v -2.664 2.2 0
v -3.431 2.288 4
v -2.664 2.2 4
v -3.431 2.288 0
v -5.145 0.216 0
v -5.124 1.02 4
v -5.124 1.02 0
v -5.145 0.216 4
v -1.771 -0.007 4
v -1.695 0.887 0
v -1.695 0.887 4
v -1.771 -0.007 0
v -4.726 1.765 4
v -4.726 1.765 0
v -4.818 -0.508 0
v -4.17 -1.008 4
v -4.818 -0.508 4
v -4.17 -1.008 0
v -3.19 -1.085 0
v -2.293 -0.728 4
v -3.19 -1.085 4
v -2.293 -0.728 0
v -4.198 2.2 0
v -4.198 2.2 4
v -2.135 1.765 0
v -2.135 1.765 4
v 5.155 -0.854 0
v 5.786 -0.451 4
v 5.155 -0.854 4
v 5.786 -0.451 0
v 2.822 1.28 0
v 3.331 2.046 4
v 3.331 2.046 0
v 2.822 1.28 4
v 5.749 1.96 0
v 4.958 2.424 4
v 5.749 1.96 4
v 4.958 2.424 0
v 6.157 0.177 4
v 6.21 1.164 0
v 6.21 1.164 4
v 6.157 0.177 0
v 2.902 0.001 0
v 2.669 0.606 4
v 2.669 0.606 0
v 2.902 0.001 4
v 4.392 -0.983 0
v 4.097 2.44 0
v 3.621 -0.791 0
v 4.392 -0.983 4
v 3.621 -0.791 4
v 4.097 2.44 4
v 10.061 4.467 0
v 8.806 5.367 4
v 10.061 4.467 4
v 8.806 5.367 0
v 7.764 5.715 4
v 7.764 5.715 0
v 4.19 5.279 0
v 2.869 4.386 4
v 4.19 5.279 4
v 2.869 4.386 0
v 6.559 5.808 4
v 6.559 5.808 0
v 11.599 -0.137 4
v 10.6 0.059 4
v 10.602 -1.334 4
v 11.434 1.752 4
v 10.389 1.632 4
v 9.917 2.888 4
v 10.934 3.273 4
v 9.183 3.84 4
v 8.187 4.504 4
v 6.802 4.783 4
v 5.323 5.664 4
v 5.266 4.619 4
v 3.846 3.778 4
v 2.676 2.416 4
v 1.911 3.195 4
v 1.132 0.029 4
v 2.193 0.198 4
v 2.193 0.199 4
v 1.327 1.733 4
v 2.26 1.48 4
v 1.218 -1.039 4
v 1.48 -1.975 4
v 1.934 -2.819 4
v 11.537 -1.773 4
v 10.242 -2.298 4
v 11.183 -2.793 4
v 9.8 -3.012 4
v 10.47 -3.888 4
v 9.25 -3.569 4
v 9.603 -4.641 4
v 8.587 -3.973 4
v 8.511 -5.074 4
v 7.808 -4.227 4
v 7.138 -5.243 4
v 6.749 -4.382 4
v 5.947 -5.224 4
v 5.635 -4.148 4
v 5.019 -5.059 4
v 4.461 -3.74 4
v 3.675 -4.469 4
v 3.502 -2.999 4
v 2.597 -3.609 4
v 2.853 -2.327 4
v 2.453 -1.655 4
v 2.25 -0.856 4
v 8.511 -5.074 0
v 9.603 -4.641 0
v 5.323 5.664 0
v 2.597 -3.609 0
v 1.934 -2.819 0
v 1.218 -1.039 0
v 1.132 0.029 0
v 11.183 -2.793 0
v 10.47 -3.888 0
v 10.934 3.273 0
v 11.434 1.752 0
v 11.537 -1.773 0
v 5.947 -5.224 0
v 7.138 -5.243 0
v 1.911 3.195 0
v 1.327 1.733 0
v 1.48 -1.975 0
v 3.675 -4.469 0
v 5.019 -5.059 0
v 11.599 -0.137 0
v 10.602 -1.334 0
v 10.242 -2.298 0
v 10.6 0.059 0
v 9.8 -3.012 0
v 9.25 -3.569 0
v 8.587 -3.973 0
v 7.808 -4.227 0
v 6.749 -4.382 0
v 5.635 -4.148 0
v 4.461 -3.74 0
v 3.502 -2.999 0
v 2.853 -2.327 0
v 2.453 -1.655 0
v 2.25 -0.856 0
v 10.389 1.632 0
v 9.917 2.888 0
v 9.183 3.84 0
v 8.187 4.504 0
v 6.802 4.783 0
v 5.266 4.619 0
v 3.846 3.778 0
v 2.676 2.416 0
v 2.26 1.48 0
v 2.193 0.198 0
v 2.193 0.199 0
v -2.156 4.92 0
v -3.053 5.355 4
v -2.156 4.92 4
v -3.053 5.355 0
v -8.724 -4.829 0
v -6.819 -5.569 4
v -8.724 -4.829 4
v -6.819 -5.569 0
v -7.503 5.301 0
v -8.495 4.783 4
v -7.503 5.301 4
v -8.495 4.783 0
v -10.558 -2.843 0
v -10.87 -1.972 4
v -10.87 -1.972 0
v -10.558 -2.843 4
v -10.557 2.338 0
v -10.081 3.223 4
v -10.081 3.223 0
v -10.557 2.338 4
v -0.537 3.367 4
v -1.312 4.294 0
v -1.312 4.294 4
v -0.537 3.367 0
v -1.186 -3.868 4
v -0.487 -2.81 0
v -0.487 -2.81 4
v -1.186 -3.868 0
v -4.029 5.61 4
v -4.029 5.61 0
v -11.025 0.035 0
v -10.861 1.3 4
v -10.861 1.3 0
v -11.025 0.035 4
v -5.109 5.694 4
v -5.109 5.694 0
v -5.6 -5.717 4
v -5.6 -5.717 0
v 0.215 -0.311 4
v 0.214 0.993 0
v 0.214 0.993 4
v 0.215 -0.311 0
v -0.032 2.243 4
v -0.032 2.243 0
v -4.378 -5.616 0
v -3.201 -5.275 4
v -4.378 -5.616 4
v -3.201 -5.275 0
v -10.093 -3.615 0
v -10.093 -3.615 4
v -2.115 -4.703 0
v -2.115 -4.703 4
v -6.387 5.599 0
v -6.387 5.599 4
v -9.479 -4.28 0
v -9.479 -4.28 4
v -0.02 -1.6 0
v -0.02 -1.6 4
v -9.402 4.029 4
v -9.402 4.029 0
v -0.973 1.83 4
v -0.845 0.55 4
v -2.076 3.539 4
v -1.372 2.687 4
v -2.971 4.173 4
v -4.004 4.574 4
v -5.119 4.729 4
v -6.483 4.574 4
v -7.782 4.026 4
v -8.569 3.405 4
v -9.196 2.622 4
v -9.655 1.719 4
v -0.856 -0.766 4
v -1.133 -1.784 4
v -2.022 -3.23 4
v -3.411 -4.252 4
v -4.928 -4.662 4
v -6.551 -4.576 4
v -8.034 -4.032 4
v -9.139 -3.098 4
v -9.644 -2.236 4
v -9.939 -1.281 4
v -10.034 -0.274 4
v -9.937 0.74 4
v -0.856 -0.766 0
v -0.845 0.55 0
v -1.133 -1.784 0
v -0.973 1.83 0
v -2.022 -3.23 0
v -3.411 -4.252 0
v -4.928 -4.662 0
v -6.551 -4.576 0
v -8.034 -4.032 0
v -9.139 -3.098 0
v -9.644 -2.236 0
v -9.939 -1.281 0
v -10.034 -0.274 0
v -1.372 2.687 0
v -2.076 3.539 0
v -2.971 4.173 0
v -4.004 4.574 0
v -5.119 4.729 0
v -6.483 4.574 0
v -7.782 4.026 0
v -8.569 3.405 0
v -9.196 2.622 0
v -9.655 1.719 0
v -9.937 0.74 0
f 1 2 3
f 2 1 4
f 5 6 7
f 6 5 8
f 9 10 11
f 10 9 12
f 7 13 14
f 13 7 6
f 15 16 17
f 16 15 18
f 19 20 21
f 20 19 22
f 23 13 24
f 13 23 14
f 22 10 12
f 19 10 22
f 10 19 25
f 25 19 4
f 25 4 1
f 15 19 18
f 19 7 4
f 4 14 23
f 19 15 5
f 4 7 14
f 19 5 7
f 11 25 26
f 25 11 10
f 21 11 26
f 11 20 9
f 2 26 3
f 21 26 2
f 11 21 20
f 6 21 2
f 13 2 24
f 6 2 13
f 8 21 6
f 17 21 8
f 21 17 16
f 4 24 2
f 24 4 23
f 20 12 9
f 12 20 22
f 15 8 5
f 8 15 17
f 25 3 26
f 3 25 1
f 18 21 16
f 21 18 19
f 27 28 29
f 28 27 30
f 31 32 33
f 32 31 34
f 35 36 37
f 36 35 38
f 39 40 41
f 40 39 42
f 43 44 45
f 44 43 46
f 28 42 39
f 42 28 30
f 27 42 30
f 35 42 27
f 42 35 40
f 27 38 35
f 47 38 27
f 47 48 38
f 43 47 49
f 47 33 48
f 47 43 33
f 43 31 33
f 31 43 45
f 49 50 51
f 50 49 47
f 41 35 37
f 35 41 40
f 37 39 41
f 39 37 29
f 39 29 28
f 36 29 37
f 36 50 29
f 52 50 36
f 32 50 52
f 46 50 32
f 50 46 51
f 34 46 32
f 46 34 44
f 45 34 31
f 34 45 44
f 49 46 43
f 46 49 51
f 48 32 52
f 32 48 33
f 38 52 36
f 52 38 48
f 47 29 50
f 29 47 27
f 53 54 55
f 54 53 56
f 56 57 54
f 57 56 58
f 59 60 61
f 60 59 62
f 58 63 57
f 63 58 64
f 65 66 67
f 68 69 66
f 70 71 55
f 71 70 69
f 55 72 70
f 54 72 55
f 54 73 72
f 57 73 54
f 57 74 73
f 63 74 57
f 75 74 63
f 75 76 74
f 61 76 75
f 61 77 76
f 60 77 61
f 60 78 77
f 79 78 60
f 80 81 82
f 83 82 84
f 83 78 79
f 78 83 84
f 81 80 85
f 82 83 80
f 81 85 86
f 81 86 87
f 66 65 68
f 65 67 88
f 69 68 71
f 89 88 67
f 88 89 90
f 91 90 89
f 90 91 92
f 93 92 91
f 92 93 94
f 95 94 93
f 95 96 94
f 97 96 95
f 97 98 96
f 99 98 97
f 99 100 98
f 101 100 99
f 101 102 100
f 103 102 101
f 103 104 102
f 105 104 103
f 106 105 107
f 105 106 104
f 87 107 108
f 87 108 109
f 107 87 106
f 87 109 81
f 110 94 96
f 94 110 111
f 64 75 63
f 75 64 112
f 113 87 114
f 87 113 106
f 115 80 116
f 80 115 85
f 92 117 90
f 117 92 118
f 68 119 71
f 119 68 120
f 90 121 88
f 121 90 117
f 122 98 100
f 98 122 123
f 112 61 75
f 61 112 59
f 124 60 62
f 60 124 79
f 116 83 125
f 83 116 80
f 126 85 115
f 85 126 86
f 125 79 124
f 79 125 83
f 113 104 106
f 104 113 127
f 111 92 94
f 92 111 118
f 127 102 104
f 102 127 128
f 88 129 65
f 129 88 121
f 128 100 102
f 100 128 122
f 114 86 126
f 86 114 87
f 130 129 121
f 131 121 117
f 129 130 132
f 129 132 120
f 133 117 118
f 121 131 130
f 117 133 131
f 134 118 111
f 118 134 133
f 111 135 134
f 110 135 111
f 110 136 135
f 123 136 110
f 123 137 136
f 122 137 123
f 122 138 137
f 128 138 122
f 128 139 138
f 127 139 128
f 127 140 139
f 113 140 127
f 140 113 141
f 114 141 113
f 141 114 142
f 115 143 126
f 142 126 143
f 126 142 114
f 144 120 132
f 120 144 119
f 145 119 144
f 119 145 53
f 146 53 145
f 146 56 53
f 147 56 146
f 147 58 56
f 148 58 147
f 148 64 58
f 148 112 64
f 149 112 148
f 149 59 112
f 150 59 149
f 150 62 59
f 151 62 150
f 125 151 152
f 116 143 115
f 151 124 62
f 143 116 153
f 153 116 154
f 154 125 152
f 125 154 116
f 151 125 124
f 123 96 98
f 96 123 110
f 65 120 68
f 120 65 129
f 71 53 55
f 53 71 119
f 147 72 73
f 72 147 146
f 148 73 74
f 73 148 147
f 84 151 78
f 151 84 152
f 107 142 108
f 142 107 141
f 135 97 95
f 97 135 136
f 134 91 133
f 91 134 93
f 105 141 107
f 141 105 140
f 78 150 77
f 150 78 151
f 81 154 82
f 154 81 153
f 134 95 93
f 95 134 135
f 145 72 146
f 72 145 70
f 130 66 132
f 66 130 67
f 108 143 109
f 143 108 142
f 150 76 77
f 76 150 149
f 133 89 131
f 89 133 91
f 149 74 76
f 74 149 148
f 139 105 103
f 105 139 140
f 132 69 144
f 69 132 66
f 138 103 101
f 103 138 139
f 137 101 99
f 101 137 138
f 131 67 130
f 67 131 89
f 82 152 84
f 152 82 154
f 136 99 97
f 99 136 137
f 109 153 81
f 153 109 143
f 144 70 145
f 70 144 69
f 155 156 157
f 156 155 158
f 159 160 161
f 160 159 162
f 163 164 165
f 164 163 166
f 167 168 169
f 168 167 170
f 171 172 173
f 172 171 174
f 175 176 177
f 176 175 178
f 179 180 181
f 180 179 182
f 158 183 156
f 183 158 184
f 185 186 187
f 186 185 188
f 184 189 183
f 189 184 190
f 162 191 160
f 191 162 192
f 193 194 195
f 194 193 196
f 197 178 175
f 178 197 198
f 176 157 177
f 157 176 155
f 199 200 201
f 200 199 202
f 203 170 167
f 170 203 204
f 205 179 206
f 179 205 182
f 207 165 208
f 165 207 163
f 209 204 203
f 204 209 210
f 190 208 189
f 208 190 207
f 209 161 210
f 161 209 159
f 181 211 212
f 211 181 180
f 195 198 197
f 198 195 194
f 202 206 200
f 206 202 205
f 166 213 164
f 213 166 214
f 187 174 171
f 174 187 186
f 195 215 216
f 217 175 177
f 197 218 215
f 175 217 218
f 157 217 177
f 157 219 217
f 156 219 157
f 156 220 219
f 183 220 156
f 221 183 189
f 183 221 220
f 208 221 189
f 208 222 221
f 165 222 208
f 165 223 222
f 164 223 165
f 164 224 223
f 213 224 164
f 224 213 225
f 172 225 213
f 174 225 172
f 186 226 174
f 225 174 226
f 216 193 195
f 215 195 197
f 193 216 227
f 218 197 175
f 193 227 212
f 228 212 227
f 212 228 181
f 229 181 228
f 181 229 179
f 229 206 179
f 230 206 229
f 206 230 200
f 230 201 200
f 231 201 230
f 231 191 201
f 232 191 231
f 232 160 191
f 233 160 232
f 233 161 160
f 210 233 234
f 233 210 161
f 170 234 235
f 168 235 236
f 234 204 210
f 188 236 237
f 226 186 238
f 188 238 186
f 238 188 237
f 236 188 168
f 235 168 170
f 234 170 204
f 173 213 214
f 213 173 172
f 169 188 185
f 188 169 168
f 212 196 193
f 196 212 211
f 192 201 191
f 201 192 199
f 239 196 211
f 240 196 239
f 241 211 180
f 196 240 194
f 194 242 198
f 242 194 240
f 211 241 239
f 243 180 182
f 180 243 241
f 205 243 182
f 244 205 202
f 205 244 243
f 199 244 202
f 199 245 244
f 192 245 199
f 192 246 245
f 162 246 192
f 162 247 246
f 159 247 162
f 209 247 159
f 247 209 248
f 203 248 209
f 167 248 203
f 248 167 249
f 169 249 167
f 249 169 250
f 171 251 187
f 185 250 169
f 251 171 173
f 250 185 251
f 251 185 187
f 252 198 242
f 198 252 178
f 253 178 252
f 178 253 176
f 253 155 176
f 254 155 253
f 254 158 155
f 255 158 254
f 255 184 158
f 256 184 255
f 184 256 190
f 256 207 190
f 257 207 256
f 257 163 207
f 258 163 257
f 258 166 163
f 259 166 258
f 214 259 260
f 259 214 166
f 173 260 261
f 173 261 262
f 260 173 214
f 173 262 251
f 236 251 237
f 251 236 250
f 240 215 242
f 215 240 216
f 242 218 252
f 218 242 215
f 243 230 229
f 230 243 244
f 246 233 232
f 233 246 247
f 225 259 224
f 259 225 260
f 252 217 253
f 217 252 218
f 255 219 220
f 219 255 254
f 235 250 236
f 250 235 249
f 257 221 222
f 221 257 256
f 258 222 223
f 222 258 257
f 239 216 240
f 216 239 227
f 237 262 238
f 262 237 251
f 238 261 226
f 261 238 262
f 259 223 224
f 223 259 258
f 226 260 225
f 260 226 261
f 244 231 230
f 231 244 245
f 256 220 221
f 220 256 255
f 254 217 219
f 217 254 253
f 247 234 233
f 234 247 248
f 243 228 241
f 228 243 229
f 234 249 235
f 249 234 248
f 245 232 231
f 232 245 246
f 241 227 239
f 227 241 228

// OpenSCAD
// Module names are of the form poly_<inkscape-path-id>().  As a result,
// you can associate a polygon in this OpenSCAD program with the corresponding
// SVG element in the Inkscape document by looking for the XML element with
// the attribute id="inkscape-path-id".

// fudge value is used to ensure that subtracted solids are a tad taller
// in the z dimension than the polygon being subtracted from.  This helps
// keep the resulting .stl file manifold.
fudge = 0.1;

module poly_path4138375(h)
{
  scale([25.4/90, -25.4/90, 1]) union()
  {
    linear_extrude(height=h)
      polygon([[-14.774480,3.573381],[-17.070983,1.799429],[-18.231885,-0.763726],[-18.156734,-3.615113],[-16.745079,-6.253763],[-14.873498,-7.796334],[-12.155571,-8.108301],[-9.437608,-7.796334],[-7.566005,-6.253763],[-6.006554,-3.141746],[-6.275105,0.025660],[-8.123546,2.578061],[-11.303766,3.845063],[-14.774480,3.573381]]);
    linear_extrude(height=h)
      polygon([[12.830654,2.801237],[10.284144,-0.004728],[9.455722,-2.148320],[10.000204,-4.534114],[11.802036,-7.249736],[14.518147,-8.646770],[17.567652,-8.590167],[20.369664,-6.944879],[22.005379,-4.123368],[21.816464,-0.625900],[20.500302,1.598714],[18.266722,3.024802],[15.561560,3.482323],[12.830654,2.801237]]);
  }
}

module poly_path42135(h)
{
  scale([25.4/90, -25.4/90, 1]) union()
  {
    difference()
    {
       linear_extrude(height=h)
         polygon([[23.241410,-20.578190],[18.862003,-20.069106],[14.847220,-18.704633],[10.167360,-15.539601],[6.769715,-11.319599],[4.702027,-6.141987],[4.012038,-0.104128],[4.315136,3.680613],[5.243595,6.999790],[6.854070,9.989838],[9.203217,12.787195],[13.022612,15.833445],[17.784729,17.927139],[21.073798,18.508689],[25.292925,18.576499],[30.157569,17.977483],[34.025362,16.443941],[37.098859,13.777313],[39.625527,9.895336],[40.880439,6.282375],[41.099385,0.483750],[40.512851,-6.207340],[38.743254,-11.597962],[35.650401,-15.827741],[31.201476,-19.016734],[27.509526,-20.251670],[23.241410,-20.578190]]);
       translate([0, 0, -fudge])
         linear_extrude(height=h+2*fudge)
           polygon([[24.101360,-16.947527],[29.007432,-15.958108],[32.537434,-13.607985],[35.138179,-10.232532],[36.811701,-5.782923],[37.560036,-0.210334],[37.567489,4.728273],[36.289240,8.142891],[34.725292,10.671233],[32.774391,12.645998],[30.425531,14.077634],[27.667708,14.976584],[23.914260,15.527340],[19.964797,14.698951],[15.805582,13.252644],[12.408137,10.624819],[10.107883,8.243586],[8.690697,5.863245],[7.972779,3.031692],[7.770334,-0.703178],[7.770334,-0.704132],[8.008522,-5.243624],[9.483650,-8.561713],[13.626653,-13.387076],[18.658607,-16.367123],[24.101360,-16.947546]]);
    }
    difference()
    {
       linear_extrude(height=h)
         polygon([[-18.101704,-20.175715],[-22.631208,-19.839745],[-26.586192,-18.782118],[-30.101959,-16.946711],[-33.313813,-14.277405],[-35.719086,-11.421753],[-37.405757,-8.284188],[-38.484003,-4.604803],[-39.063997,-0.123690],[-38.515128,6.986358],[-37.411903,10.073103],[-35.764058,12.810483],[-33.588197,15.164432],[-30.913039,17.111206],[-24.161228,19.733619],[-19.842678,20.258028],[-15.513985,19.900519],[-11.342311,18.691876],[-7.494818,16.662882],[-4.203444,13.706823],[-1.727163,9.957425],[-0.070626,5.670162],[0.761517,1.100507],[0.759576,-3.516858],[-0.113053,-7.946522],[-1.901393,-11.931927],[-4.650469,-15.216514],[-7.638045,-17.433159],[-10.817057,-18.975973],[-14.275584,-19.878857],[-18.101704,-20.175715]]);
       translate([0, 0, -fudge])
         linear_extrude(height=h+2*fudge)
           polygon([[-18.137146,-16.757468],[-14.187929,-16.205964],[-10.528646,-14.784642],[-7.354821,-12.540691],[-4.861974,-9.521300],[-3.447706,-6.485260],[-2.995872,-1.947873],[-3.032817,2.715446],[-4.013234,6.319639],[-7.165891,11.443971],[-12.085111,15.066023],[-17.461577,16.520535],[-23.212793,16.212893],[-28.466198,14.285091],[-32.384029,10.977919],[-34.170891,7.922621],[-35.218238,4.537245],[-35.554681,0.972545],[-35.208833,-2.620723],[-34.209308,-6.091803],[-32.584717,-9.289939],[-30.363674,-12.064376],[-27.574790,-14.264359],[-22.970843,-16.206246],[-18.137146,-16.757468]]);
    }
  }
}

module poly_path41883(h)
{
  scale([25.4/90, -25.4/90, 1]) union()
  {
    difference()
    {
       linear_extrude(height=h)
         polygon([[28.673387,-76.404478],[25.912814,-75.649136],[23.524410,-73.948446],[19.074638,-69.936101],[18.823504,-70.108233],[15.751698,-70.583826],[12.004675,-69.449860],[10.936355,-71.034572],[9.480295,-72.118842],[6.974586,-72.284769],[5.630328,-71.508388],[5.044742,-71.754166],[3.099236,-71.515988],[1.605594,-70.527039],[1.410384,-70.242219],[-0.220489,-71.503950],[-2.291404,-71.886247],[-4.341943,-71.267039],[-4.532747,-71.083373],[-4.721733,-72.094887],[-6.008296,-74.031850],[-8.275318,-74.786938],[-10.999769,-74.021764],[-13.048094,-72.068270],[-14.096879,-68.117146],[-15.580424,-69.763078],[-18.000952,-71.491529],[-20.443695,-71.621071],[-22.241340,-70.101137],[-24.751501,-71.014161],[-26.132148,-71.246633],[-27.161699,-71.234395],[-28.542909,-70.689413],[-29.621007,-69.476722],[-30.024682,-68.321224],[-30.109862,-66.942366],[-29.750515,-64.142066],[-28.962632,-60.788094],[-28.839291,-60.343557],[-36.119889,-58.311481],[-45.463628,-53.861870],[-50.316241,-50.949772],[-51.574685,-49.251212],[-52.154718,-47.344693],[-53.154698,-46.799007],[-56.701361,-44.463145],[-60.428739,-41.222361],[-63.834174,-37.849754],[-65.096796,-36.346679],[-66.071930,-34.589834],[-66.228094,-32.289081],[-68.868683,-29.668899],[-73.623696,-24.430312],[-74.329000,-23.011185],[-74.242141,-20.860727],[-73.589092,-19.777338],[-76.242992,-15.397655],[-78.679502,-11.594707],[-79.474518,-10.216740],[-79.766434,-9.625803],[-80.082314,-8.243397],[-79.389337,-6.320631],[-81.450523,-3.892993],[-84.567585,-0.625087],[-85.285421,0.681741],[-85.261452,2.172551],[-84.339552,5.435138],[-82.340477,12.930112],[-82.310312,13.096924],[-83.418546,15.930942],[-84.237517,20.122521],[-84.499268,24.234243],[-84.292528,26.092241],[-83.956233,27.238484],[-82.651033,28.568679],[-81.272752,29.099781],[-80.455867,29.042495],[-79.809029,28.925373],[-79.137349,30.288257],[-78.441710,30.824180],[-78.630701,35.889749],[-78.208235,38.757762],[-76.529588,41.272962],[-74.955863,42.066292],[-73.408973,42.251648],[-73.108180,42.201073],[-72.687603,45.418403],[-71.510166,50.160105],[-70.105578,53.337507],[-69.276270,54.159497],[-67.920170,54.758952],[-67.090550,54.720801],[-65.601672,57.380910],[-63.410240,58.904459],[-60.798744,59.364013],[-59.576941,59.057896],[-59.332935,59.822744],[-58.298351,63.799599],[-57.913264,65.936204],[-57.286832,68.795954],[-55.828307,70.162551],[-53.887607,70.716947],[-51.233460,69.924190],[-49.321590,68.192594],[-46.252089,69.971968],[-42.212585,71.195199],[-39.007685,72.476452],[-38.555230,72.950080],[-38.627895,72.117098],[-38.141385,73.880563],[-37.076024,75.056705],[-34.583626,75.836637],[-31.943946,74.938694],[-31.795755,74.748813],[-29.533140,74.942244],[-28.619235,75.077112],[-28.379731,75.205065],[-28.732808,74.900541],[-27.739039,75.515436],[-26.257095,76.182206],[-24.575829,76.255440],[-22.618477,75.389716],[-21.198783,74.068259],[-19.448158,73.478207],[-17.742781,74.053174],[-14.704684,76.038939],[-10.714522,76.404505],[-6.525799,75.929171],[-2.698718,74.332672],[0.149966,72.916666],[2.495508,72.332710],[10.149330,72.976886],[19.164311,73.733948],[28.061130,71.960046],[35.222497,70.713398],[39.022764,70.960066],[40.159097,71.514058],[41.871011,71.690309],[43.085704,71.304336],[45.095413,72.199616],[47.173131,71.974381],[48.881506,70.896180],[50.467995,67.714342],[51.065120,67.780002],[52.785591,67.325850],[54.278938,66.072847],[55.000852,64.214182],[54.895597,62.314268],[55.085158,62.831340],[55.283338,62.384364],[56.865374,62.823574],[58.649640,62.636936],[60.224703,61.858198],[62.311739,59.533954],[64.110150,56.233638],[68.312377,48.128202],[68.372707,48.012854],[70.453423,48.578948],[72.877494,47.737792],[74.177368,45.657974],[74.807384,41.071549],[74.807384,41.027182],[77.099256,41.764524],[79.337885,40.975719],[80.501152,39.257918],[80.651978,36.499317],[79.968764,33.782421],[81.666146,32.377836],[82.263015,30.716254],[82.221612,29.175590],[81.368037,26.710686],[82.993260,25.109275],[83.600442,23.016878],[83.704351,23.179979],[83.844444,22.688578],[85.022896,20.365126],[85.285421,17.971721],[85.285421,17.970812],[85.228635,16.535168],[84.191389,14.306284],[82.363579,13.396809],[82.417685,12.639059],[81.893293,10.420823],[82.372438,10.037508],[83.303407,8.318723],[83.486868,6.827279],[83.518624,4.346947],[82.958069,1.921426],[82.470066,1.036792],[83.816016,0.260741],[84.898589,-1.255975],[85.177583,-3.087119],[84.804505,-4.310045],[83.634196,-6.399624],[83.634196,-6.400532],[82.010410,-9.911554],[80.410083,-13.240376],[77.718596,-16.640796],[78.754934,-17.402985],[79.625362,-19.751653],[78.945283,-22.017894],[77.389414,-23.819013],[72.255519,-27.234206],[68.401101,-29.828657],[70.671711,-32.937737],[71.544332,-34.859656],[71.537688,-37.250875],[70.826734,-38.628502],[69.630013,-39.650120],[69.213879,-39.785877],[69.252949,-39.916309],[69.174072,-41.076174],[68.410005,-42.457521],[66.778269,-43.442418],[65.458860,-43.785801],[62.470464,-44.140719],[56.805089,-43.996090],[58.927100,-46.443291],[59.750010,-49.484894],[59.329469,-51.314493],[57.237214,-52.995030],[55.569158,-53.190588],[54.234598,-52.962184],[52.234656,-53.037602],[48.618015,-53.538035],[47.720102,-53.733241],[50.698731,-59.453630],[51.049986,-62.349758],[49.946328,-65.135863],[48.601825,-66.220425],[46.973877,-66.723233],[44.795579,-66.424216],[44.610136,-67.240525],[43.840799,-68.661731],[42.299592,-69.808358],[40.359089,-70.007900],[38.795662,-69.450778],[36.768190,-67.655782],[36.545494,-67.481869],[36.158662,-68.187270],[34.968007,-69.202869],[33.246542,-69.676149],[32.586406,-69.606056],[32.722149,-70.694764],[32.815552,-72.318792],[32.394739,-74.071806],[30.826218,-75.729002],[28.671657,-76.404505]]);
       translate([0, 0, -fudge])
         linear_extrude(height=h+2*fudge)
           polygon([[29.340610,-69.223603],[29.257202,-69.146409],[29.340610,-69.223603]]);
       translate([0, 0, -fudge])
         linear_extrude(height=h+2*fudge)
           polygon([[24.604269,-67.590095],[24.562474,-67.470307],[24.557931,-67.466673],[24.603360,-67.590009]]);
       translate([0, 0, -fudge])
         linear_extrude(height=h+2*fudge)
           polygon([[9.143163,-66.962778],[9.149523,-66.960961],[9.184958,-66.846501],[9.143163,-66.962737]]);
       translate([0, 0, -fudge])
         linear_extrude(height=h+2*fudge)
           polygon([[15.457997,-63.631870],[15.396803,-63.232590],[15.357734,-63.237906],[15.457997,-63.631861]]);
       translate([0, 0, -fudge])
         linear_extrude(height=h+2*fudge)
           polygon([[23.443682,-63.631870],[24.283860,-62.131208],[25.456072,-61.184716],[25.486964,-61.173177],[24.729200,-59.661224],[24.408104,-58.463607],[24.740103,-56.714518],[26.342537,-55.103194],[27.894408,-54.773117],[29.623772,-55.150218],[31.056754,-55.755352],[33.064692,-56.757994],[33.003453,-56.362263],[33.626365,-54.405477],[35.053140,-52.977235],[37.114321,-52.522940],[36.898713,-51.164490],[37.281280,-49.657728],[37.932370,-48.877047],[38.777086,-48.302078],[40.078777,-47.789225],[43.296092,-47.003081],[46.719249,-46.422788],[46.099046,-45.705856],[45.418512,-44.291509],[45.703310,-41.844350],[47.314648,-40.404272],[47.423770,-39.460188],[48.403925,-37.599735],[50.382001,-36.886149],[57.054456,-37.045861],[57.105065,-37.045861],[56.805139,-36.635042],[56.206242,-34.677672],[56.632445,-32.967007],[57.719953,-31.579241],[59.976344,-30.715903],[59.613453,-29.123209],[59.990217,-27.408769],[60.750054,-26.333553],[62.530844,-24.661889],[65.250434,-22.779050],[64.724270,-21.228061],[65.177656,-19.578580],[65.628408,-18.877617],[66.760601,-17.464156],[70.120793,-13.884812],[74.422374,-8.778429],[73.106895,-8.739881],[71.697514,-8.064160],[70.640637,-6.549929],[70.402955,-5.116568],[71.519203,-1.302574],[74.574972,2.706711],[74.873125,3.177865],[74.166833,3.389925],[72.437515,5.099741],[72.165982,6.861910],[73.393987,10.202576],[72.753386,10.886680],[72.204143,12.889302],[72.885585,15.192718],[74.090512,17.313352],[74.533267,17.954867],[72.256478,17.975264],[70.482775,18.800450],[69.279620,21.075472],[69.499454,22.946178],[70.216603,24.184552],[70.315095,24.304336],[70.021393,25.091366],[69.868795,27.050512],[68.655874,27.685816],[67.741060,29.041604],[67.373717,30.990988],[67.441135,36.704277],[67.454309,37.724668],[67.135758,37.708677],[65.466770,38.585325],[63.959283,40.519627],[59.918512,48.063405],[56.844072,54.149358],[56.594710,53.991420],[54.968289,53.551322],[53.562973,53.803326],[52.898249,54.248735],[51.939097,55.040202],[50.221272,56.925703],[49.686249,57.666594],[48.366840,57.041051],[45.998647,57.312563],[44.491938,58.681481],[43.955229,60.123513],[43.769786,61.886567],[43.207232,61.670954],[41.611437,61.633942],[40.042251,62.268103],[39.009412,63.394968],[35.663440,63.548470],[30.090770,63.966382],[24.780762,65.244089],[18.736614,66.585757],[12.151912,65.812845],[6.809194,65.046544],[2.339365,65.073069],[-1.836566,65.952171],[-6.297591,67.743598],[-11.537064,69.846486],[-12.996906,68.246970],[-14.747582,67.174455],[-18.677125,66.236085],[-22.004607,66.397571],[-25.154369,67.650432],[-26.346893,67.224531],[-28.017006,67.278747],[-29.243022,67.716092],[-30.739947,66.641783],[-32.479873,66.102103],[-34.570356,66.363855],[-36.678556,65.284905],[-40.342217,64.098592],[-43.276290,63.216108],[-44.789332,62.033858],[-46.471640,60.450924],[-47.306584,59.835142],[-47.780993,59.458467],[-49.204509,59.230007],[-50.535614,59.437214],[-51.034995,59.785453],[-51.547853,60.150132],[-53.488364,53.321513],[-54.541583,50.657855],[-55.537602,49.435409],[-57.166203,48.557628],[-58.671055,48.517700],[-58.490931,47.808752],[-58.688377,45.833638],[-60.066766,43.953457],[-62.090156,43.293473],[-63.778323,43.560386],[-65.384323,44.208111],[-65.715407,42.058308],[-65.340847,40.382097],[-65.340847,40.381188],[-64.786285,38.239259],[-64.676264,37.184264],[-64.740147,36.406997],[-65.586625,34.783247],[-67.190854,33.939431],[-67.922873,33.865785],[-68.988512,33.931445],[-71.291042,34.375977],[-71.296357,34.341359],[-71.421656,32.961408],[-70.948540,32.191446],[-69.840125,29.921179],[-69.818127,27.337946],[-70.328318,26.270531],[-69.787072,25.705324],[-69.156206,24.831338],[-68.586561,22.963582],[-69.053805,21.369443],[-69.969853,20.321217],[-71.451635,19.674383],[-73.782558,19.509343],[-76.620124,19.931696],[-75.913841,17.073723],[-75.221574,15.234397],[-74.979516,13.030322],[-76.231489,7.057940],[-77.352143,2.615254],[-75.016786,0.066061],[-71.981800,-3.560453],[-71.149486,-5.268686],[-70.858035,-7.176925],[-71.212067,-9.324181],[-71.217382,-9.336583],[-69.441903,-12.221178],[-66.695126,-16.685985],[-65.747210,-20.461482],[-65.958384,-22.075473],[-64.280510,-23.570562],[-59.505090,-28.358402],[-58.418429,-30.422226],[-58.100506,-32.767370],[-57.876020,-33.093894],[-55.367636,-35.751342],[-48.940964,-40.604841],[-47.031509,-41.544911],[-45.446796,-42.793797],[-44.371394,-45.123834],[-44.438829,-45.978299],[-38.594209,-48.974691],[-31.840639,-51.957579],[-27.301621,-53.199102],[-24.182796,-53.734143],[-23.141098,-53.935554],[-22.749814,-54.023397],[-22.507584,-54.089946],[-21.720564,-54.459947],[-21.720564,-54.460855],[-20.612311,-55.641845],[-17.744575,-54.773183],[-15.669221,-55.131654],[-14.563751,-56.094904],[-13.851133,-57.455476],[-13.396838,-57.230105],[-12.027775,-57.044657],[-9.030474,-58.225647],[-8.627651,-58.711887],[-6.806684,-58.225878],[-5.088240,-58.450132],[-3.310993,-59.529972],[-1.346486,-58.748263],[0.890370,-59.259344],[1.934703,-59.775750],[3.437783,-58.443922],[5.083739,-58.180394],[7.635212,-58.886569],[9.268203,-60.419927],[9.356927,-60.561008],[9.756206,-60.336523],[9.935954,-58.990058],[10.680787,-57.687948],[12.204242,-56.714171],[13.706436,-56.476789],[15.322226,-56.870749],[16.236994,-57.396027],[18.151802,-58.836105],[23.346890,-63.540541],[23.442746,-63.631932]]);
       translate([0, 0, -fudge])
         linear_extrude(height=h+2*fudge)
           polygon([[15.315167,-62.700211],[15.203365,-62.599063],[15.315167,-62.700211]]);
       translate([0, 0, -fudge])
         linear_extrude(height=h+2*fudge)
           polygon([[52.176057,-47.034141],[52.418287,-46.941860],[52.186687,-46.973797],[52.176239,-47.034132]]);
       translate([0, 0, -fudge])
         linear_extrude(height=h+2*fudge)
           polygon([[48.348260,-40.138087],[49.138823,-40.008540],[48.348260,-40.138087]]);
       translate([0, 0, -fudge])
         linear_extrude(height=h+2*fudge)
           polygon([[82.797481,19.755182],[82.551662,19.857222],[82.636842,19.788014],[82.797481,19.755169]]);
       translate([0, 0, -fudge])
         linear_extrude(height=h+2*fudge)
           polygon([[-74.171157,24.006210],[-73.284751,24.182781],[-74.171157,24.006210]]);
       translate([0, 0, -fudge])
         linear_extrude(height=h+2*fudge)
           polygon([[-77.396473,28.252803],[-77.527792,28.515440],[-77.396473,28.252803]]);
       translate([0, 0, -fudge])
         linear_extrude(height=h+2*fudge)
           polygon([[-71.003514,36.108910],[-70.951166,36.322746],[-71.003514,36.108910]]);
       translate([0, 0, -fudge])
         linear_extrude(height=h+2*fudge)
           polygon([[-64.748088,46.895748],[-64.691301,47.094502],[-64.748088,46.895748]]);
       translate([0, 0, -fudge])
         linear_extrude(height=h+2*fudge)
           polygon([[-62.707309,50.966656],[-62.798700,51.100637],[-62.707309,50.966656]]);
       translate([0, 0, -fudge])
         linear_extrude(height=h+2*fudge)
           polygon([[52.099735,60.171449],[52.215081,60.319628],[52.099735,60.171449]]);
       translate([0, 0, -fudge])
         linear_extrude(height=h+2*fudge)
           polygon([[-36.430966,67.923742],[-36.909202,68.717870],[-36.430966,67.923742]]);
       translate([0, 0, -fudge])
         linear_extrude(height=h+2*fudge)
           polygon([[-30.539353,72.015057],[-30.666237,72.629065],[-30.702581,72.687626],[-30.539353,72.015057]]);
       translate([0, 0, -fudge])
         linear_extrude(height=h+2*fudge)
           polygon([[-33.643958,74.202238],[-33.184348,74.337994],[-33.643958,74.202238]]);
    }
  }
}

poly_path4138375(4);
poly_path42135(4);
poly_path41883(4);
